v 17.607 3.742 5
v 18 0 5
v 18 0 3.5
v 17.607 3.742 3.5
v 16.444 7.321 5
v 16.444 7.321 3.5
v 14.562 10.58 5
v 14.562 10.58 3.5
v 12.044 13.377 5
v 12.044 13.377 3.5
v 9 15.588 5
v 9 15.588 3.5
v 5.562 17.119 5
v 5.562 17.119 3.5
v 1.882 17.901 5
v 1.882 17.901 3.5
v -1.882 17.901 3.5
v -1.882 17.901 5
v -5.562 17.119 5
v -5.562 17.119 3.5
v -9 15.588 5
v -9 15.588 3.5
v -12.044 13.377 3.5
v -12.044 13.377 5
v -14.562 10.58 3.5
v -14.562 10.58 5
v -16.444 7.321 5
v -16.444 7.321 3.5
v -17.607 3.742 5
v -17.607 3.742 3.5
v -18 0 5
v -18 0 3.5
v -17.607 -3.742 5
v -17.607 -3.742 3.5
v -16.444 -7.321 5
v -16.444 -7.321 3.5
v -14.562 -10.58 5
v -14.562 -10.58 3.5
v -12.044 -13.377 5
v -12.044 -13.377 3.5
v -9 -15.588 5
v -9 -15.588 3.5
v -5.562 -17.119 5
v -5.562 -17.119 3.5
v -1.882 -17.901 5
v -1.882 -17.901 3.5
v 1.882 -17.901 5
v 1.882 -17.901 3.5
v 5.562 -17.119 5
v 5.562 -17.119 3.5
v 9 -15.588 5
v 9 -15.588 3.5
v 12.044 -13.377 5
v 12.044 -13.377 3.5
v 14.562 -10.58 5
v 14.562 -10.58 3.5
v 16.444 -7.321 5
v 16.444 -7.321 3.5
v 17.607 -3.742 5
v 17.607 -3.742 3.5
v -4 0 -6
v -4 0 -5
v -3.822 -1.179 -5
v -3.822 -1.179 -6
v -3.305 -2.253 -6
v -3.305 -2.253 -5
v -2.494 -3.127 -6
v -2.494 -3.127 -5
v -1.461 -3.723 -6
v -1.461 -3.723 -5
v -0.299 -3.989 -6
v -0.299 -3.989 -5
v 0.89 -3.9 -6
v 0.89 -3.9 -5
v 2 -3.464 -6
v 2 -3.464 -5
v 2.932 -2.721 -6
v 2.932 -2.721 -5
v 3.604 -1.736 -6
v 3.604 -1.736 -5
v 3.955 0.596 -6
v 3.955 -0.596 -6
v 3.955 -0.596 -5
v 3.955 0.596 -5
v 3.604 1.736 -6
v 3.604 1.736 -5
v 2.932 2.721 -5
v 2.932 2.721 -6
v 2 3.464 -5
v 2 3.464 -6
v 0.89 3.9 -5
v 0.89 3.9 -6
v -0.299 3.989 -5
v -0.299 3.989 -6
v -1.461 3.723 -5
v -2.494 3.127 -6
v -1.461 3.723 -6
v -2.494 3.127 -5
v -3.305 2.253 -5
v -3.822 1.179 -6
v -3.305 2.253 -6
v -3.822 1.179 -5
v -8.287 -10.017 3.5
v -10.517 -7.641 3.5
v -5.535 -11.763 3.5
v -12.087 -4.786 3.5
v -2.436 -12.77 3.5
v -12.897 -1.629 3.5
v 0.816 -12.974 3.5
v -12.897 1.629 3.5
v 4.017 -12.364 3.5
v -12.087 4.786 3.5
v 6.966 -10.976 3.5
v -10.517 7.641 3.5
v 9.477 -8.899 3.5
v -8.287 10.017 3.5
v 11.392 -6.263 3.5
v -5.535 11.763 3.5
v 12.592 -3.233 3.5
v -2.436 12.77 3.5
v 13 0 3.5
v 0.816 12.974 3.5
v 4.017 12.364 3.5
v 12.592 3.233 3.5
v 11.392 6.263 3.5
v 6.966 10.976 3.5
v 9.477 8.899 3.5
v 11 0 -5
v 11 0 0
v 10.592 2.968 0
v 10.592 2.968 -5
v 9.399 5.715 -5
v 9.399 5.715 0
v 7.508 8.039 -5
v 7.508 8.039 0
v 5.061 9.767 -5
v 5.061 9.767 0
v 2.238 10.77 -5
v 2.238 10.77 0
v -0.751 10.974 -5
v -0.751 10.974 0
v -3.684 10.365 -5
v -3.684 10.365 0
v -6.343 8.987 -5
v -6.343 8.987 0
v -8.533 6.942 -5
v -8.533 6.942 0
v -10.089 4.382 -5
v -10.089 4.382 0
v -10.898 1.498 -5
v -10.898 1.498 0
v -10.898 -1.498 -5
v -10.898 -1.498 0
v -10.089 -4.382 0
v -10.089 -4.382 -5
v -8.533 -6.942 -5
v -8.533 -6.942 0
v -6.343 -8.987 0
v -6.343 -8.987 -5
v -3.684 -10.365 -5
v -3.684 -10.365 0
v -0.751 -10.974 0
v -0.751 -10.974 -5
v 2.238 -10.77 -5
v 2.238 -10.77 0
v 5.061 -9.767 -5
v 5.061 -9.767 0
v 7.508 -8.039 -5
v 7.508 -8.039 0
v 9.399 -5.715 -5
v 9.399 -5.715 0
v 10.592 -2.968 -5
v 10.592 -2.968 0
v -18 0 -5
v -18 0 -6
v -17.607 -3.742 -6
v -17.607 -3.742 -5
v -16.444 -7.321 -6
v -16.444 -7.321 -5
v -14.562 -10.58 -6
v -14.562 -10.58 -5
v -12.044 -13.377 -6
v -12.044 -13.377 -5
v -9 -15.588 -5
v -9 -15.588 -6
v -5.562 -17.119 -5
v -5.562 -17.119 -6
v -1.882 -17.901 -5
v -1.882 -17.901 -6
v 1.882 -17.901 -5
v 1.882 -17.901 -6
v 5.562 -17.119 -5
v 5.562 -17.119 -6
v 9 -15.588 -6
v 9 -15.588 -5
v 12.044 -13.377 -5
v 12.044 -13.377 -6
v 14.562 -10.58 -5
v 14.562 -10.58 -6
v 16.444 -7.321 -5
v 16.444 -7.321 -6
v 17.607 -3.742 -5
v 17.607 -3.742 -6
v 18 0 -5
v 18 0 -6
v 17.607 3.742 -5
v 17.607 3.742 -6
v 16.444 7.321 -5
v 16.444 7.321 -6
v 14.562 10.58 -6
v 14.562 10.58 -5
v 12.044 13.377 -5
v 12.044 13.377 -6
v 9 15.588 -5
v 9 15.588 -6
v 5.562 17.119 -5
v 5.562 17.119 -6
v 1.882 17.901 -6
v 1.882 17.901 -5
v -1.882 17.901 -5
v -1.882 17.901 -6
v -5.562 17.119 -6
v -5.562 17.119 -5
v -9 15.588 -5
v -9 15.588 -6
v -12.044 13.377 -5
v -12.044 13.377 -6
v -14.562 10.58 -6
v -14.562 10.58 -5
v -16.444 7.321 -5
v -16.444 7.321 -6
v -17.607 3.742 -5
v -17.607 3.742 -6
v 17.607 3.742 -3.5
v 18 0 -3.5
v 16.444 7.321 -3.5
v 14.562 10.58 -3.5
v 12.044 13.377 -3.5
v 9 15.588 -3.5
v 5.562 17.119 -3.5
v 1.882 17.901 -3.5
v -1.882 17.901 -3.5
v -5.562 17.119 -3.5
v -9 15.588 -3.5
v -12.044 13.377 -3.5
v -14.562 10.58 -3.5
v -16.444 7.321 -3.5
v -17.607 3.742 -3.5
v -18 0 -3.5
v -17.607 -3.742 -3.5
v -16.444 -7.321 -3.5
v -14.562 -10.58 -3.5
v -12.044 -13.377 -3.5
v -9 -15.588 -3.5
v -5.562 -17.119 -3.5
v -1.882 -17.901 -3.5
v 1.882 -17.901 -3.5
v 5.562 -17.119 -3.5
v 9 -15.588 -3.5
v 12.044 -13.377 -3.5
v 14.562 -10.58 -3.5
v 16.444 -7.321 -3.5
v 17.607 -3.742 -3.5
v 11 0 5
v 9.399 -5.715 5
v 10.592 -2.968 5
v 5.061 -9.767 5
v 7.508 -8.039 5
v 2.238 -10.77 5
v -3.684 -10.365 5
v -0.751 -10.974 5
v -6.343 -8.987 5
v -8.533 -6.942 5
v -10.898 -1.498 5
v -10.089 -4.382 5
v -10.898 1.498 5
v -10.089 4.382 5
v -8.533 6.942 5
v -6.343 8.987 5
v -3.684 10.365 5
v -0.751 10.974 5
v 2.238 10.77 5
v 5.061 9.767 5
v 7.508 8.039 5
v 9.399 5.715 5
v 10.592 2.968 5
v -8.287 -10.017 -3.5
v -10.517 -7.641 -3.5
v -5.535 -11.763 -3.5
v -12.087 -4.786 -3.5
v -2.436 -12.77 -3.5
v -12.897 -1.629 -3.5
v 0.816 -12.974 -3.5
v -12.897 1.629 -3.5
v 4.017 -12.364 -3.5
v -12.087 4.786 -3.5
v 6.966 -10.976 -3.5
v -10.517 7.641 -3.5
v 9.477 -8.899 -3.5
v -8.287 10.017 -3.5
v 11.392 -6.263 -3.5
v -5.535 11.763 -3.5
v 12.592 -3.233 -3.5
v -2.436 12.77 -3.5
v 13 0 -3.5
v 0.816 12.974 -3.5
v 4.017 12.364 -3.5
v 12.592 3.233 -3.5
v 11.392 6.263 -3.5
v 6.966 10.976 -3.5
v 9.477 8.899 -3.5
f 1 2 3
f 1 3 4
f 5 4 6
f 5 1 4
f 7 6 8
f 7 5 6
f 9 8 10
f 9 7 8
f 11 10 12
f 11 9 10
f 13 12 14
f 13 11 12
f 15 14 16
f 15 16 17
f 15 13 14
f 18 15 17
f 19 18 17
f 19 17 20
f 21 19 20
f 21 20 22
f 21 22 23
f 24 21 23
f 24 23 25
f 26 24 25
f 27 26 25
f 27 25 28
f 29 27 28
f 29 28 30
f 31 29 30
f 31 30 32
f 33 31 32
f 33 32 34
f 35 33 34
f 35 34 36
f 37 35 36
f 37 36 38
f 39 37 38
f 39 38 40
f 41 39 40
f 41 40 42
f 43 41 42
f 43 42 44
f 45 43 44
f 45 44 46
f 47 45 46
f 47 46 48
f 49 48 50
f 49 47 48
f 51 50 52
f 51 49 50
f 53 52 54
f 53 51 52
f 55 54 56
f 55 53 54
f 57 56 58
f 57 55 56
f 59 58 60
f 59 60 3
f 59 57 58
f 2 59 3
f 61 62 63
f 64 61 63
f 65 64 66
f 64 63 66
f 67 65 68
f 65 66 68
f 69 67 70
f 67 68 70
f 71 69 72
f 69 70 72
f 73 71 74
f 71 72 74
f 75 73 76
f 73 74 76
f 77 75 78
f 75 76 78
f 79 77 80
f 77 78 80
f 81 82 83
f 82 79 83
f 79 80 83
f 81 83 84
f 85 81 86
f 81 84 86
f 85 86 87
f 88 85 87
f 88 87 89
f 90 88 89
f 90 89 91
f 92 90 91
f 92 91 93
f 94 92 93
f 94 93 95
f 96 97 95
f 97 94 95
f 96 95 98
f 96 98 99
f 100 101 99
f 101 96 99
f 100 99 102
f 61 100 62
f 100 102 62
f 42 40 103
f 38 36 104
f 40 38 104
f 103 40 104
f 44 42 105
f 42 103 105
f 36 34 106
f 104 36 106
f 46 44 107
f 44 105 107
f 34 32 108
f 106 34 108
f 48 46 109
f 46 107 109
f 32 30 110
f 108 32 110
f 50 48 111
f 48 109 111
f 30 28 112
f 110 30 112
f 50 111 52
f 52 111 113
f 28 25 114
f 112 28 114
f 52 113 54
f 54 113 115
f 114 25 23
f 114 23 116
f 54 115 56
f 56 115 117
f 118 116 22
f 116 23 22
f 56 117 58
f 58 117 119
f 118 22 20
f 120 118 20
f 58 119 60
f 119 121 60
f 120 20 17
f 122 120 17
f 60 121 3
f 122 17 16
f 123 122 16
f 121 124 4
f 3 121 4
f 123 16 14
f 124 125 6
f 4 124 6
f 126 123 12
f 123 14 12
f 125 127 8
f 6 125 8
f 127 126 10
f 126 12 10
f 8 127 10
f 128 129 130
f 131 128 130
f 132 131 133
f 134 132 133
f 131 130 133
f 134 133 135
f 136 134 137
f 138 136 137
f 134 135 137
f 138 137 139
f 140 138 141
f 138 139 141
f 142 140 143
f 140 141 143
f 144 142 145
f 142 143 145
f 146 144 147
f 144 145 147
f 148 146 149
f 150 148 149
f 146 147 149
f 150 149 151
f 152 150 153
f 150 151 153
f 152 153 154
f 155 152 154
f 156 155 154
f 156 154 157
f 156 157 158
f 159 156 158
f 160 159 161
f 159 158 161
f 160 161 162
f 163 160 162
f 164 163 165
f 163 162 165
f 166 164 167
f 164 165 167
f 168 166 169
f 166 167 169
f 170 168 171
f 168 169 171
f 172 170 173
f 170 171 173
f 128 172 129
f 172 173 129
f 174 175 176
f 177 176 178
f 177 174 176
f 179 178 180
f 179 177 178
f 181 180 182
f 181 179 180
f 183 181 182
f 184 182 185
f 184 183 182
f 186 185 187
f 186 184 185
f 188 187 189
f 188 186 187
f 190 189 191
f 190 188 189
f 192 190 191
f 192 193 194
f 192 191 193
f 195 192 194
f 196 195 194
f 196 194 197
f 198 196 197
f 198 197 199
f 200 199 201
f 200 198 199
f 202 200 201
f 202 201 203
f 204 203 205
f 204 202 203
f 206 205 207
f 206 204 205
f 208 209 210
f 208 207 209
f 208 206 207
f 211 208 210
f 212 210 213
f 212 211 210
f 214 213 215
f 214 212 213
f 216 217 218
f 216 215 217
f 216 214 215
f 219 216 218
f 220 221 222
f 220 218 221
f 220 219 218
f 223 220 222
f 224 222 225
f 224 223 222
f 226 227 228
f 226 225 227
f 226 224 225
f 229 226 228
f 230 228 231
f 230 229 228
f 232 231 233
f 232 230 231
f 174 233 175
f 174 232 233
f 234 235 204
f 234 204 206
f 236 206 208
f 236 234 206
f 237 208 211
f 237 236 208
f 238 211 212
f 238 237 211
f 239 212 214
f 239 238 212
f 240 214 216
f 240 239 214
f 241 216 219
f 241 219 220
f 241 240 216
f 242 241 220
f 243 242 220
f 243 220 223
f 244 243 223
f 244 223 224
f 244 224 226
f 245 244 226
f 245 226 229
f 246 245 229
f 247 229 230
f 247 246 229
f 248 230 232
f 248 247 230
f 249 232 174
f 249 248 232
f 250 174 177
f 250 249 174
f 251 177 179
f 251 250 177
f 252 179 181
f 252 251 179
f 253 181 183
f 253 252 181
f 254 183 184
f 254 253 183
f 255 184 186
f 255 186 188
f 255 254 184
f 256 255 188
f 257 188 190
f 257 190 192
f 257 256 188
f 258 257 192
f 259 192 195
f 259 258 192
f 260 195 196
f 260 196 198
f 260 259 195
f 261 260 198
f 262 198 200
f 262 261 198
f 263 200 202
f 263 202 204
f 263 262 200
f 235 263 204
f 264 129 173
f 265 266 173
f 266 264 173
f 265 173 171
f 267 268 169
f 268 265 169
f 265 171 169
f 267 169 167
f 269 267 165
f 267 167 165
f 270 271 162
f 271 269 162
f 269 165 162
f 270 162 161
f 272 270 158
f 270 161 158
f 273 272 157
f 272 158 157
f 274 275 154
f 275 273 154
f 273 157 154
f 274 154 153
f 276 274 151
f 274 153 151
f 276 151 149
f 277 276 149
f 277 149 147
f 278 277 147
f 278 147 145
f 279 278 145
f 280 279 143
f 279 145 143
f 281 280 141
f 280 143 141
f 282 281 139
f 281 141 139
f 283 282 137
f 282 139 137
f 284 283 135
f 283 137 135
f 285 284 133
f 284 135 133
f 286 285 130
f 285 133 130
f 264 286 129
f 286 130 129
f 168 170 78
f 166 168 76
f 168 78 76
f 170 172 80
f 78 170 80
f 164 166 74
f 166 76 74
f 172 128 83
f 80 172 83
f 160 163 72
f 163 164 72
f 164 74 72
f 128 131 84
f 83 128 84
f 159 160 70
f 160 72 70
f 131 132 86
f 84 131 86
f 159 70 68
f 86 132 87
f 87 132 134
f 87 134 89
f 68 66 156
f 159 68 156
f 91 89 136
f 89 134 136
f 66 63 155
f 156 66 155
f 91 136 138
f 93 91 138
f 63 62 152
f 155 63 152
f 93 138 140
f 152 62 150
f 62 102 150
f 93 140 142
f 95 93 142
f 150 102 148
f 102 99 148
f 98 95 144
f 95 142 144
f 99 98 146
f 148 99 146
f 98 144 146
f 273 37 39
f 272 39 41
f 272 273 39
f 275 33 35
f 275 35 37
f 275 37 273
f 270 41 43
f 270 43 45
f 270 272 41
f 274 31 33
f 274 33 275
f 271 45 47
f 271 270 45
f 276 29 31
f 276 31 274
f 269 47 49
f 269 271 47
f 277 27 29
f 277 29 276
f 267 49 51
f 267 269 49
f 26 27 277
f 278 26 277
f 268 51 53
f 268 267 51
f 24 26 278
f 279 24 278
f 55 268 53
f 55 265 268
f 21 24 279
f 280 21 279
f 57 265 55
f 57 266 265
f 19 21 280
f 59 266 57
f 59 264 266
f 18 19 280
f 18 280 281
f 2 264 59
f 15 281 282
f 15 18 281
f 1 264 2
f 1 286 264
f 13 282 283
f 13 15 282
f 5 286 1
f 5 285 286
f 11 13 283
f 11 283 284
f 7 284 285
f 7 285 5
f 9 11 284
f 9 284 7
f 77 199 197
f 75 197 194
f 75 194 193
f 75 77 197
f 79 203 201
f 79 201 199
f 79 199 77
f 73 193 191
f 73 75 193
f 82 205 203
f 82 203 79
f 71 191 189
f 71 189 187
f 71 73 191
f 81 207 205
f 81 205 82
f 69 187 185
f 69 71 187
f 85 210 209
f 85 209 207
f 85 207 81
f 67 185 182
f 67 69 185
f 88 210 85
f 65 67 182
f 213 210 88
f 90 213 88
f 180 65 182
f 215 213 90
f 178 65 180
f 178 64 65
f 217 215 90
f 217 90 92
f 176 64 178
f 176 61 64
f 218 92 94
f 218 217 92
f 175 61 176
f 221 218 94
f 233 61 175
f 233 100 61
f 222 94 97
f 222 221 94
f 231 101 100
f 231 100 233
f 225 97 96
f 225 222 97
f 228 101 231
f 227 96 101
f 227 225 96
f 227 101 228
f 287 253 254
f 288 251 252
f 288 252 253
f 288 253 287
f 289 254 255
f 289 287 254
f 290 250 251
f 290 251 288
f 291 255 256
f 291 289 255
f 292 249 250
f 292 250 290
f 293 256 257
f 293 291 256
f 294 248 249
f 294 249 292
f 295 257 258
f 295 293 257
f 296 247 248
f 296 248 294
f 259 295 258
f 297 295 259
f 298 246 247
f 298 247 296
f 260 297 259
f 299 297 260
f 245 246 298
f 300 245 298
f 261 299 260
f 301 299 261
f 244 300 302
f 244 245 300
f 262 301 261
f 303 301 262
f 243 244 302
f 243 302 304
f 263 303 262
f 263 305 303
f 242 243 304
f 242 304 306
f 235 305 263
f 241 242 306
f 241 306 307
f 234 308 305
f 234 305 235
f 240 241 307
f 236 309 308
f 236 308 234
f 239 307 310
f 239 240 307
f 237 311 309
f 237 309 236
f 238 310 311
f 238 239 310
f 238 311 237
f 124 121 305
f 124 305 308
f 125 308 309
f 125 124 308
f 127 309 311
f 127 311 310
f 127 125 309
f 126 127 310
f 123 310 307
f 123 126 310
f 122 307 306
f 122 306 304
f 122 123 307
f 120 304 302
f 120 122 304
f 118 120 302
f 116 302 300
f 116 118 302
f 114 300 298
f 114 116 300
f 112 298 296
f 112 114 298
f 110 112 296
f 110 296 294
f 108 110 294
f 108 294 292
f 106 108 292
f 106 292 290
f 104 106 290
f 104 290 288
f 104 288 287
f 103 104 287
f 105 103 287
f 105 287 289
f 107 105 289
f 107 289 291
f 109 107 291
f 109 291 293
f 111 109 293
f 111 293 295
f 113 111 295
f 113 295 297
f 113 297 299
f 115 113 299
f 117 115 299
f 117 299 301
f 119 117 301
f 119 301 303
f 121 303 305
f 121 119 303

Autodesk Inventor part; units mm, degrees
ref_plane "YZ Plane" through (0, 0, 0) normal (1, 0, 0) x (0, 1, 0)
ref_plane "XZ Plane" through (0, 0, 0) normal (0, 1, 0) x (-1, 0, 0)
ref_plane "XY Plane" through (0, 0, 0) normal (0, 0, 1) x (1, 0, 0)
sketch "Sketch1" plane through (0, 0, 0) normal (0, 0, 1) x (1, 0, 0)
  circle A0 centre (0, 0) radius 11
  circle A1 centre (0, 0) radius 18
  circle A2 centre (0, 0) radius 13
  dimension "d0" = 22
  dimension "d2" = 2
  dimension "d3" = 5
extrude "Extrusion1" add sketch "Sketch1" along normal mid plane 10 contours A1 | A2
extrude "Extrusion2" cut sketch "Sketch1" along normal mid plane 7 contours A1
sketch "Sketch2" plane through (0, 0, -5) normal (0, 0, -1) x (-1, 0, 0)
  circle A0 centre (0, 0) radius 4
  circle A1 centre (0, 0) radius 18 projected
  dimension "d8" = 8
extrude "Extrusion3" add sketch "Sketch2" along normal blind 1
properties part number "Belt Tensioner" material "PC/ABS Plastic"
